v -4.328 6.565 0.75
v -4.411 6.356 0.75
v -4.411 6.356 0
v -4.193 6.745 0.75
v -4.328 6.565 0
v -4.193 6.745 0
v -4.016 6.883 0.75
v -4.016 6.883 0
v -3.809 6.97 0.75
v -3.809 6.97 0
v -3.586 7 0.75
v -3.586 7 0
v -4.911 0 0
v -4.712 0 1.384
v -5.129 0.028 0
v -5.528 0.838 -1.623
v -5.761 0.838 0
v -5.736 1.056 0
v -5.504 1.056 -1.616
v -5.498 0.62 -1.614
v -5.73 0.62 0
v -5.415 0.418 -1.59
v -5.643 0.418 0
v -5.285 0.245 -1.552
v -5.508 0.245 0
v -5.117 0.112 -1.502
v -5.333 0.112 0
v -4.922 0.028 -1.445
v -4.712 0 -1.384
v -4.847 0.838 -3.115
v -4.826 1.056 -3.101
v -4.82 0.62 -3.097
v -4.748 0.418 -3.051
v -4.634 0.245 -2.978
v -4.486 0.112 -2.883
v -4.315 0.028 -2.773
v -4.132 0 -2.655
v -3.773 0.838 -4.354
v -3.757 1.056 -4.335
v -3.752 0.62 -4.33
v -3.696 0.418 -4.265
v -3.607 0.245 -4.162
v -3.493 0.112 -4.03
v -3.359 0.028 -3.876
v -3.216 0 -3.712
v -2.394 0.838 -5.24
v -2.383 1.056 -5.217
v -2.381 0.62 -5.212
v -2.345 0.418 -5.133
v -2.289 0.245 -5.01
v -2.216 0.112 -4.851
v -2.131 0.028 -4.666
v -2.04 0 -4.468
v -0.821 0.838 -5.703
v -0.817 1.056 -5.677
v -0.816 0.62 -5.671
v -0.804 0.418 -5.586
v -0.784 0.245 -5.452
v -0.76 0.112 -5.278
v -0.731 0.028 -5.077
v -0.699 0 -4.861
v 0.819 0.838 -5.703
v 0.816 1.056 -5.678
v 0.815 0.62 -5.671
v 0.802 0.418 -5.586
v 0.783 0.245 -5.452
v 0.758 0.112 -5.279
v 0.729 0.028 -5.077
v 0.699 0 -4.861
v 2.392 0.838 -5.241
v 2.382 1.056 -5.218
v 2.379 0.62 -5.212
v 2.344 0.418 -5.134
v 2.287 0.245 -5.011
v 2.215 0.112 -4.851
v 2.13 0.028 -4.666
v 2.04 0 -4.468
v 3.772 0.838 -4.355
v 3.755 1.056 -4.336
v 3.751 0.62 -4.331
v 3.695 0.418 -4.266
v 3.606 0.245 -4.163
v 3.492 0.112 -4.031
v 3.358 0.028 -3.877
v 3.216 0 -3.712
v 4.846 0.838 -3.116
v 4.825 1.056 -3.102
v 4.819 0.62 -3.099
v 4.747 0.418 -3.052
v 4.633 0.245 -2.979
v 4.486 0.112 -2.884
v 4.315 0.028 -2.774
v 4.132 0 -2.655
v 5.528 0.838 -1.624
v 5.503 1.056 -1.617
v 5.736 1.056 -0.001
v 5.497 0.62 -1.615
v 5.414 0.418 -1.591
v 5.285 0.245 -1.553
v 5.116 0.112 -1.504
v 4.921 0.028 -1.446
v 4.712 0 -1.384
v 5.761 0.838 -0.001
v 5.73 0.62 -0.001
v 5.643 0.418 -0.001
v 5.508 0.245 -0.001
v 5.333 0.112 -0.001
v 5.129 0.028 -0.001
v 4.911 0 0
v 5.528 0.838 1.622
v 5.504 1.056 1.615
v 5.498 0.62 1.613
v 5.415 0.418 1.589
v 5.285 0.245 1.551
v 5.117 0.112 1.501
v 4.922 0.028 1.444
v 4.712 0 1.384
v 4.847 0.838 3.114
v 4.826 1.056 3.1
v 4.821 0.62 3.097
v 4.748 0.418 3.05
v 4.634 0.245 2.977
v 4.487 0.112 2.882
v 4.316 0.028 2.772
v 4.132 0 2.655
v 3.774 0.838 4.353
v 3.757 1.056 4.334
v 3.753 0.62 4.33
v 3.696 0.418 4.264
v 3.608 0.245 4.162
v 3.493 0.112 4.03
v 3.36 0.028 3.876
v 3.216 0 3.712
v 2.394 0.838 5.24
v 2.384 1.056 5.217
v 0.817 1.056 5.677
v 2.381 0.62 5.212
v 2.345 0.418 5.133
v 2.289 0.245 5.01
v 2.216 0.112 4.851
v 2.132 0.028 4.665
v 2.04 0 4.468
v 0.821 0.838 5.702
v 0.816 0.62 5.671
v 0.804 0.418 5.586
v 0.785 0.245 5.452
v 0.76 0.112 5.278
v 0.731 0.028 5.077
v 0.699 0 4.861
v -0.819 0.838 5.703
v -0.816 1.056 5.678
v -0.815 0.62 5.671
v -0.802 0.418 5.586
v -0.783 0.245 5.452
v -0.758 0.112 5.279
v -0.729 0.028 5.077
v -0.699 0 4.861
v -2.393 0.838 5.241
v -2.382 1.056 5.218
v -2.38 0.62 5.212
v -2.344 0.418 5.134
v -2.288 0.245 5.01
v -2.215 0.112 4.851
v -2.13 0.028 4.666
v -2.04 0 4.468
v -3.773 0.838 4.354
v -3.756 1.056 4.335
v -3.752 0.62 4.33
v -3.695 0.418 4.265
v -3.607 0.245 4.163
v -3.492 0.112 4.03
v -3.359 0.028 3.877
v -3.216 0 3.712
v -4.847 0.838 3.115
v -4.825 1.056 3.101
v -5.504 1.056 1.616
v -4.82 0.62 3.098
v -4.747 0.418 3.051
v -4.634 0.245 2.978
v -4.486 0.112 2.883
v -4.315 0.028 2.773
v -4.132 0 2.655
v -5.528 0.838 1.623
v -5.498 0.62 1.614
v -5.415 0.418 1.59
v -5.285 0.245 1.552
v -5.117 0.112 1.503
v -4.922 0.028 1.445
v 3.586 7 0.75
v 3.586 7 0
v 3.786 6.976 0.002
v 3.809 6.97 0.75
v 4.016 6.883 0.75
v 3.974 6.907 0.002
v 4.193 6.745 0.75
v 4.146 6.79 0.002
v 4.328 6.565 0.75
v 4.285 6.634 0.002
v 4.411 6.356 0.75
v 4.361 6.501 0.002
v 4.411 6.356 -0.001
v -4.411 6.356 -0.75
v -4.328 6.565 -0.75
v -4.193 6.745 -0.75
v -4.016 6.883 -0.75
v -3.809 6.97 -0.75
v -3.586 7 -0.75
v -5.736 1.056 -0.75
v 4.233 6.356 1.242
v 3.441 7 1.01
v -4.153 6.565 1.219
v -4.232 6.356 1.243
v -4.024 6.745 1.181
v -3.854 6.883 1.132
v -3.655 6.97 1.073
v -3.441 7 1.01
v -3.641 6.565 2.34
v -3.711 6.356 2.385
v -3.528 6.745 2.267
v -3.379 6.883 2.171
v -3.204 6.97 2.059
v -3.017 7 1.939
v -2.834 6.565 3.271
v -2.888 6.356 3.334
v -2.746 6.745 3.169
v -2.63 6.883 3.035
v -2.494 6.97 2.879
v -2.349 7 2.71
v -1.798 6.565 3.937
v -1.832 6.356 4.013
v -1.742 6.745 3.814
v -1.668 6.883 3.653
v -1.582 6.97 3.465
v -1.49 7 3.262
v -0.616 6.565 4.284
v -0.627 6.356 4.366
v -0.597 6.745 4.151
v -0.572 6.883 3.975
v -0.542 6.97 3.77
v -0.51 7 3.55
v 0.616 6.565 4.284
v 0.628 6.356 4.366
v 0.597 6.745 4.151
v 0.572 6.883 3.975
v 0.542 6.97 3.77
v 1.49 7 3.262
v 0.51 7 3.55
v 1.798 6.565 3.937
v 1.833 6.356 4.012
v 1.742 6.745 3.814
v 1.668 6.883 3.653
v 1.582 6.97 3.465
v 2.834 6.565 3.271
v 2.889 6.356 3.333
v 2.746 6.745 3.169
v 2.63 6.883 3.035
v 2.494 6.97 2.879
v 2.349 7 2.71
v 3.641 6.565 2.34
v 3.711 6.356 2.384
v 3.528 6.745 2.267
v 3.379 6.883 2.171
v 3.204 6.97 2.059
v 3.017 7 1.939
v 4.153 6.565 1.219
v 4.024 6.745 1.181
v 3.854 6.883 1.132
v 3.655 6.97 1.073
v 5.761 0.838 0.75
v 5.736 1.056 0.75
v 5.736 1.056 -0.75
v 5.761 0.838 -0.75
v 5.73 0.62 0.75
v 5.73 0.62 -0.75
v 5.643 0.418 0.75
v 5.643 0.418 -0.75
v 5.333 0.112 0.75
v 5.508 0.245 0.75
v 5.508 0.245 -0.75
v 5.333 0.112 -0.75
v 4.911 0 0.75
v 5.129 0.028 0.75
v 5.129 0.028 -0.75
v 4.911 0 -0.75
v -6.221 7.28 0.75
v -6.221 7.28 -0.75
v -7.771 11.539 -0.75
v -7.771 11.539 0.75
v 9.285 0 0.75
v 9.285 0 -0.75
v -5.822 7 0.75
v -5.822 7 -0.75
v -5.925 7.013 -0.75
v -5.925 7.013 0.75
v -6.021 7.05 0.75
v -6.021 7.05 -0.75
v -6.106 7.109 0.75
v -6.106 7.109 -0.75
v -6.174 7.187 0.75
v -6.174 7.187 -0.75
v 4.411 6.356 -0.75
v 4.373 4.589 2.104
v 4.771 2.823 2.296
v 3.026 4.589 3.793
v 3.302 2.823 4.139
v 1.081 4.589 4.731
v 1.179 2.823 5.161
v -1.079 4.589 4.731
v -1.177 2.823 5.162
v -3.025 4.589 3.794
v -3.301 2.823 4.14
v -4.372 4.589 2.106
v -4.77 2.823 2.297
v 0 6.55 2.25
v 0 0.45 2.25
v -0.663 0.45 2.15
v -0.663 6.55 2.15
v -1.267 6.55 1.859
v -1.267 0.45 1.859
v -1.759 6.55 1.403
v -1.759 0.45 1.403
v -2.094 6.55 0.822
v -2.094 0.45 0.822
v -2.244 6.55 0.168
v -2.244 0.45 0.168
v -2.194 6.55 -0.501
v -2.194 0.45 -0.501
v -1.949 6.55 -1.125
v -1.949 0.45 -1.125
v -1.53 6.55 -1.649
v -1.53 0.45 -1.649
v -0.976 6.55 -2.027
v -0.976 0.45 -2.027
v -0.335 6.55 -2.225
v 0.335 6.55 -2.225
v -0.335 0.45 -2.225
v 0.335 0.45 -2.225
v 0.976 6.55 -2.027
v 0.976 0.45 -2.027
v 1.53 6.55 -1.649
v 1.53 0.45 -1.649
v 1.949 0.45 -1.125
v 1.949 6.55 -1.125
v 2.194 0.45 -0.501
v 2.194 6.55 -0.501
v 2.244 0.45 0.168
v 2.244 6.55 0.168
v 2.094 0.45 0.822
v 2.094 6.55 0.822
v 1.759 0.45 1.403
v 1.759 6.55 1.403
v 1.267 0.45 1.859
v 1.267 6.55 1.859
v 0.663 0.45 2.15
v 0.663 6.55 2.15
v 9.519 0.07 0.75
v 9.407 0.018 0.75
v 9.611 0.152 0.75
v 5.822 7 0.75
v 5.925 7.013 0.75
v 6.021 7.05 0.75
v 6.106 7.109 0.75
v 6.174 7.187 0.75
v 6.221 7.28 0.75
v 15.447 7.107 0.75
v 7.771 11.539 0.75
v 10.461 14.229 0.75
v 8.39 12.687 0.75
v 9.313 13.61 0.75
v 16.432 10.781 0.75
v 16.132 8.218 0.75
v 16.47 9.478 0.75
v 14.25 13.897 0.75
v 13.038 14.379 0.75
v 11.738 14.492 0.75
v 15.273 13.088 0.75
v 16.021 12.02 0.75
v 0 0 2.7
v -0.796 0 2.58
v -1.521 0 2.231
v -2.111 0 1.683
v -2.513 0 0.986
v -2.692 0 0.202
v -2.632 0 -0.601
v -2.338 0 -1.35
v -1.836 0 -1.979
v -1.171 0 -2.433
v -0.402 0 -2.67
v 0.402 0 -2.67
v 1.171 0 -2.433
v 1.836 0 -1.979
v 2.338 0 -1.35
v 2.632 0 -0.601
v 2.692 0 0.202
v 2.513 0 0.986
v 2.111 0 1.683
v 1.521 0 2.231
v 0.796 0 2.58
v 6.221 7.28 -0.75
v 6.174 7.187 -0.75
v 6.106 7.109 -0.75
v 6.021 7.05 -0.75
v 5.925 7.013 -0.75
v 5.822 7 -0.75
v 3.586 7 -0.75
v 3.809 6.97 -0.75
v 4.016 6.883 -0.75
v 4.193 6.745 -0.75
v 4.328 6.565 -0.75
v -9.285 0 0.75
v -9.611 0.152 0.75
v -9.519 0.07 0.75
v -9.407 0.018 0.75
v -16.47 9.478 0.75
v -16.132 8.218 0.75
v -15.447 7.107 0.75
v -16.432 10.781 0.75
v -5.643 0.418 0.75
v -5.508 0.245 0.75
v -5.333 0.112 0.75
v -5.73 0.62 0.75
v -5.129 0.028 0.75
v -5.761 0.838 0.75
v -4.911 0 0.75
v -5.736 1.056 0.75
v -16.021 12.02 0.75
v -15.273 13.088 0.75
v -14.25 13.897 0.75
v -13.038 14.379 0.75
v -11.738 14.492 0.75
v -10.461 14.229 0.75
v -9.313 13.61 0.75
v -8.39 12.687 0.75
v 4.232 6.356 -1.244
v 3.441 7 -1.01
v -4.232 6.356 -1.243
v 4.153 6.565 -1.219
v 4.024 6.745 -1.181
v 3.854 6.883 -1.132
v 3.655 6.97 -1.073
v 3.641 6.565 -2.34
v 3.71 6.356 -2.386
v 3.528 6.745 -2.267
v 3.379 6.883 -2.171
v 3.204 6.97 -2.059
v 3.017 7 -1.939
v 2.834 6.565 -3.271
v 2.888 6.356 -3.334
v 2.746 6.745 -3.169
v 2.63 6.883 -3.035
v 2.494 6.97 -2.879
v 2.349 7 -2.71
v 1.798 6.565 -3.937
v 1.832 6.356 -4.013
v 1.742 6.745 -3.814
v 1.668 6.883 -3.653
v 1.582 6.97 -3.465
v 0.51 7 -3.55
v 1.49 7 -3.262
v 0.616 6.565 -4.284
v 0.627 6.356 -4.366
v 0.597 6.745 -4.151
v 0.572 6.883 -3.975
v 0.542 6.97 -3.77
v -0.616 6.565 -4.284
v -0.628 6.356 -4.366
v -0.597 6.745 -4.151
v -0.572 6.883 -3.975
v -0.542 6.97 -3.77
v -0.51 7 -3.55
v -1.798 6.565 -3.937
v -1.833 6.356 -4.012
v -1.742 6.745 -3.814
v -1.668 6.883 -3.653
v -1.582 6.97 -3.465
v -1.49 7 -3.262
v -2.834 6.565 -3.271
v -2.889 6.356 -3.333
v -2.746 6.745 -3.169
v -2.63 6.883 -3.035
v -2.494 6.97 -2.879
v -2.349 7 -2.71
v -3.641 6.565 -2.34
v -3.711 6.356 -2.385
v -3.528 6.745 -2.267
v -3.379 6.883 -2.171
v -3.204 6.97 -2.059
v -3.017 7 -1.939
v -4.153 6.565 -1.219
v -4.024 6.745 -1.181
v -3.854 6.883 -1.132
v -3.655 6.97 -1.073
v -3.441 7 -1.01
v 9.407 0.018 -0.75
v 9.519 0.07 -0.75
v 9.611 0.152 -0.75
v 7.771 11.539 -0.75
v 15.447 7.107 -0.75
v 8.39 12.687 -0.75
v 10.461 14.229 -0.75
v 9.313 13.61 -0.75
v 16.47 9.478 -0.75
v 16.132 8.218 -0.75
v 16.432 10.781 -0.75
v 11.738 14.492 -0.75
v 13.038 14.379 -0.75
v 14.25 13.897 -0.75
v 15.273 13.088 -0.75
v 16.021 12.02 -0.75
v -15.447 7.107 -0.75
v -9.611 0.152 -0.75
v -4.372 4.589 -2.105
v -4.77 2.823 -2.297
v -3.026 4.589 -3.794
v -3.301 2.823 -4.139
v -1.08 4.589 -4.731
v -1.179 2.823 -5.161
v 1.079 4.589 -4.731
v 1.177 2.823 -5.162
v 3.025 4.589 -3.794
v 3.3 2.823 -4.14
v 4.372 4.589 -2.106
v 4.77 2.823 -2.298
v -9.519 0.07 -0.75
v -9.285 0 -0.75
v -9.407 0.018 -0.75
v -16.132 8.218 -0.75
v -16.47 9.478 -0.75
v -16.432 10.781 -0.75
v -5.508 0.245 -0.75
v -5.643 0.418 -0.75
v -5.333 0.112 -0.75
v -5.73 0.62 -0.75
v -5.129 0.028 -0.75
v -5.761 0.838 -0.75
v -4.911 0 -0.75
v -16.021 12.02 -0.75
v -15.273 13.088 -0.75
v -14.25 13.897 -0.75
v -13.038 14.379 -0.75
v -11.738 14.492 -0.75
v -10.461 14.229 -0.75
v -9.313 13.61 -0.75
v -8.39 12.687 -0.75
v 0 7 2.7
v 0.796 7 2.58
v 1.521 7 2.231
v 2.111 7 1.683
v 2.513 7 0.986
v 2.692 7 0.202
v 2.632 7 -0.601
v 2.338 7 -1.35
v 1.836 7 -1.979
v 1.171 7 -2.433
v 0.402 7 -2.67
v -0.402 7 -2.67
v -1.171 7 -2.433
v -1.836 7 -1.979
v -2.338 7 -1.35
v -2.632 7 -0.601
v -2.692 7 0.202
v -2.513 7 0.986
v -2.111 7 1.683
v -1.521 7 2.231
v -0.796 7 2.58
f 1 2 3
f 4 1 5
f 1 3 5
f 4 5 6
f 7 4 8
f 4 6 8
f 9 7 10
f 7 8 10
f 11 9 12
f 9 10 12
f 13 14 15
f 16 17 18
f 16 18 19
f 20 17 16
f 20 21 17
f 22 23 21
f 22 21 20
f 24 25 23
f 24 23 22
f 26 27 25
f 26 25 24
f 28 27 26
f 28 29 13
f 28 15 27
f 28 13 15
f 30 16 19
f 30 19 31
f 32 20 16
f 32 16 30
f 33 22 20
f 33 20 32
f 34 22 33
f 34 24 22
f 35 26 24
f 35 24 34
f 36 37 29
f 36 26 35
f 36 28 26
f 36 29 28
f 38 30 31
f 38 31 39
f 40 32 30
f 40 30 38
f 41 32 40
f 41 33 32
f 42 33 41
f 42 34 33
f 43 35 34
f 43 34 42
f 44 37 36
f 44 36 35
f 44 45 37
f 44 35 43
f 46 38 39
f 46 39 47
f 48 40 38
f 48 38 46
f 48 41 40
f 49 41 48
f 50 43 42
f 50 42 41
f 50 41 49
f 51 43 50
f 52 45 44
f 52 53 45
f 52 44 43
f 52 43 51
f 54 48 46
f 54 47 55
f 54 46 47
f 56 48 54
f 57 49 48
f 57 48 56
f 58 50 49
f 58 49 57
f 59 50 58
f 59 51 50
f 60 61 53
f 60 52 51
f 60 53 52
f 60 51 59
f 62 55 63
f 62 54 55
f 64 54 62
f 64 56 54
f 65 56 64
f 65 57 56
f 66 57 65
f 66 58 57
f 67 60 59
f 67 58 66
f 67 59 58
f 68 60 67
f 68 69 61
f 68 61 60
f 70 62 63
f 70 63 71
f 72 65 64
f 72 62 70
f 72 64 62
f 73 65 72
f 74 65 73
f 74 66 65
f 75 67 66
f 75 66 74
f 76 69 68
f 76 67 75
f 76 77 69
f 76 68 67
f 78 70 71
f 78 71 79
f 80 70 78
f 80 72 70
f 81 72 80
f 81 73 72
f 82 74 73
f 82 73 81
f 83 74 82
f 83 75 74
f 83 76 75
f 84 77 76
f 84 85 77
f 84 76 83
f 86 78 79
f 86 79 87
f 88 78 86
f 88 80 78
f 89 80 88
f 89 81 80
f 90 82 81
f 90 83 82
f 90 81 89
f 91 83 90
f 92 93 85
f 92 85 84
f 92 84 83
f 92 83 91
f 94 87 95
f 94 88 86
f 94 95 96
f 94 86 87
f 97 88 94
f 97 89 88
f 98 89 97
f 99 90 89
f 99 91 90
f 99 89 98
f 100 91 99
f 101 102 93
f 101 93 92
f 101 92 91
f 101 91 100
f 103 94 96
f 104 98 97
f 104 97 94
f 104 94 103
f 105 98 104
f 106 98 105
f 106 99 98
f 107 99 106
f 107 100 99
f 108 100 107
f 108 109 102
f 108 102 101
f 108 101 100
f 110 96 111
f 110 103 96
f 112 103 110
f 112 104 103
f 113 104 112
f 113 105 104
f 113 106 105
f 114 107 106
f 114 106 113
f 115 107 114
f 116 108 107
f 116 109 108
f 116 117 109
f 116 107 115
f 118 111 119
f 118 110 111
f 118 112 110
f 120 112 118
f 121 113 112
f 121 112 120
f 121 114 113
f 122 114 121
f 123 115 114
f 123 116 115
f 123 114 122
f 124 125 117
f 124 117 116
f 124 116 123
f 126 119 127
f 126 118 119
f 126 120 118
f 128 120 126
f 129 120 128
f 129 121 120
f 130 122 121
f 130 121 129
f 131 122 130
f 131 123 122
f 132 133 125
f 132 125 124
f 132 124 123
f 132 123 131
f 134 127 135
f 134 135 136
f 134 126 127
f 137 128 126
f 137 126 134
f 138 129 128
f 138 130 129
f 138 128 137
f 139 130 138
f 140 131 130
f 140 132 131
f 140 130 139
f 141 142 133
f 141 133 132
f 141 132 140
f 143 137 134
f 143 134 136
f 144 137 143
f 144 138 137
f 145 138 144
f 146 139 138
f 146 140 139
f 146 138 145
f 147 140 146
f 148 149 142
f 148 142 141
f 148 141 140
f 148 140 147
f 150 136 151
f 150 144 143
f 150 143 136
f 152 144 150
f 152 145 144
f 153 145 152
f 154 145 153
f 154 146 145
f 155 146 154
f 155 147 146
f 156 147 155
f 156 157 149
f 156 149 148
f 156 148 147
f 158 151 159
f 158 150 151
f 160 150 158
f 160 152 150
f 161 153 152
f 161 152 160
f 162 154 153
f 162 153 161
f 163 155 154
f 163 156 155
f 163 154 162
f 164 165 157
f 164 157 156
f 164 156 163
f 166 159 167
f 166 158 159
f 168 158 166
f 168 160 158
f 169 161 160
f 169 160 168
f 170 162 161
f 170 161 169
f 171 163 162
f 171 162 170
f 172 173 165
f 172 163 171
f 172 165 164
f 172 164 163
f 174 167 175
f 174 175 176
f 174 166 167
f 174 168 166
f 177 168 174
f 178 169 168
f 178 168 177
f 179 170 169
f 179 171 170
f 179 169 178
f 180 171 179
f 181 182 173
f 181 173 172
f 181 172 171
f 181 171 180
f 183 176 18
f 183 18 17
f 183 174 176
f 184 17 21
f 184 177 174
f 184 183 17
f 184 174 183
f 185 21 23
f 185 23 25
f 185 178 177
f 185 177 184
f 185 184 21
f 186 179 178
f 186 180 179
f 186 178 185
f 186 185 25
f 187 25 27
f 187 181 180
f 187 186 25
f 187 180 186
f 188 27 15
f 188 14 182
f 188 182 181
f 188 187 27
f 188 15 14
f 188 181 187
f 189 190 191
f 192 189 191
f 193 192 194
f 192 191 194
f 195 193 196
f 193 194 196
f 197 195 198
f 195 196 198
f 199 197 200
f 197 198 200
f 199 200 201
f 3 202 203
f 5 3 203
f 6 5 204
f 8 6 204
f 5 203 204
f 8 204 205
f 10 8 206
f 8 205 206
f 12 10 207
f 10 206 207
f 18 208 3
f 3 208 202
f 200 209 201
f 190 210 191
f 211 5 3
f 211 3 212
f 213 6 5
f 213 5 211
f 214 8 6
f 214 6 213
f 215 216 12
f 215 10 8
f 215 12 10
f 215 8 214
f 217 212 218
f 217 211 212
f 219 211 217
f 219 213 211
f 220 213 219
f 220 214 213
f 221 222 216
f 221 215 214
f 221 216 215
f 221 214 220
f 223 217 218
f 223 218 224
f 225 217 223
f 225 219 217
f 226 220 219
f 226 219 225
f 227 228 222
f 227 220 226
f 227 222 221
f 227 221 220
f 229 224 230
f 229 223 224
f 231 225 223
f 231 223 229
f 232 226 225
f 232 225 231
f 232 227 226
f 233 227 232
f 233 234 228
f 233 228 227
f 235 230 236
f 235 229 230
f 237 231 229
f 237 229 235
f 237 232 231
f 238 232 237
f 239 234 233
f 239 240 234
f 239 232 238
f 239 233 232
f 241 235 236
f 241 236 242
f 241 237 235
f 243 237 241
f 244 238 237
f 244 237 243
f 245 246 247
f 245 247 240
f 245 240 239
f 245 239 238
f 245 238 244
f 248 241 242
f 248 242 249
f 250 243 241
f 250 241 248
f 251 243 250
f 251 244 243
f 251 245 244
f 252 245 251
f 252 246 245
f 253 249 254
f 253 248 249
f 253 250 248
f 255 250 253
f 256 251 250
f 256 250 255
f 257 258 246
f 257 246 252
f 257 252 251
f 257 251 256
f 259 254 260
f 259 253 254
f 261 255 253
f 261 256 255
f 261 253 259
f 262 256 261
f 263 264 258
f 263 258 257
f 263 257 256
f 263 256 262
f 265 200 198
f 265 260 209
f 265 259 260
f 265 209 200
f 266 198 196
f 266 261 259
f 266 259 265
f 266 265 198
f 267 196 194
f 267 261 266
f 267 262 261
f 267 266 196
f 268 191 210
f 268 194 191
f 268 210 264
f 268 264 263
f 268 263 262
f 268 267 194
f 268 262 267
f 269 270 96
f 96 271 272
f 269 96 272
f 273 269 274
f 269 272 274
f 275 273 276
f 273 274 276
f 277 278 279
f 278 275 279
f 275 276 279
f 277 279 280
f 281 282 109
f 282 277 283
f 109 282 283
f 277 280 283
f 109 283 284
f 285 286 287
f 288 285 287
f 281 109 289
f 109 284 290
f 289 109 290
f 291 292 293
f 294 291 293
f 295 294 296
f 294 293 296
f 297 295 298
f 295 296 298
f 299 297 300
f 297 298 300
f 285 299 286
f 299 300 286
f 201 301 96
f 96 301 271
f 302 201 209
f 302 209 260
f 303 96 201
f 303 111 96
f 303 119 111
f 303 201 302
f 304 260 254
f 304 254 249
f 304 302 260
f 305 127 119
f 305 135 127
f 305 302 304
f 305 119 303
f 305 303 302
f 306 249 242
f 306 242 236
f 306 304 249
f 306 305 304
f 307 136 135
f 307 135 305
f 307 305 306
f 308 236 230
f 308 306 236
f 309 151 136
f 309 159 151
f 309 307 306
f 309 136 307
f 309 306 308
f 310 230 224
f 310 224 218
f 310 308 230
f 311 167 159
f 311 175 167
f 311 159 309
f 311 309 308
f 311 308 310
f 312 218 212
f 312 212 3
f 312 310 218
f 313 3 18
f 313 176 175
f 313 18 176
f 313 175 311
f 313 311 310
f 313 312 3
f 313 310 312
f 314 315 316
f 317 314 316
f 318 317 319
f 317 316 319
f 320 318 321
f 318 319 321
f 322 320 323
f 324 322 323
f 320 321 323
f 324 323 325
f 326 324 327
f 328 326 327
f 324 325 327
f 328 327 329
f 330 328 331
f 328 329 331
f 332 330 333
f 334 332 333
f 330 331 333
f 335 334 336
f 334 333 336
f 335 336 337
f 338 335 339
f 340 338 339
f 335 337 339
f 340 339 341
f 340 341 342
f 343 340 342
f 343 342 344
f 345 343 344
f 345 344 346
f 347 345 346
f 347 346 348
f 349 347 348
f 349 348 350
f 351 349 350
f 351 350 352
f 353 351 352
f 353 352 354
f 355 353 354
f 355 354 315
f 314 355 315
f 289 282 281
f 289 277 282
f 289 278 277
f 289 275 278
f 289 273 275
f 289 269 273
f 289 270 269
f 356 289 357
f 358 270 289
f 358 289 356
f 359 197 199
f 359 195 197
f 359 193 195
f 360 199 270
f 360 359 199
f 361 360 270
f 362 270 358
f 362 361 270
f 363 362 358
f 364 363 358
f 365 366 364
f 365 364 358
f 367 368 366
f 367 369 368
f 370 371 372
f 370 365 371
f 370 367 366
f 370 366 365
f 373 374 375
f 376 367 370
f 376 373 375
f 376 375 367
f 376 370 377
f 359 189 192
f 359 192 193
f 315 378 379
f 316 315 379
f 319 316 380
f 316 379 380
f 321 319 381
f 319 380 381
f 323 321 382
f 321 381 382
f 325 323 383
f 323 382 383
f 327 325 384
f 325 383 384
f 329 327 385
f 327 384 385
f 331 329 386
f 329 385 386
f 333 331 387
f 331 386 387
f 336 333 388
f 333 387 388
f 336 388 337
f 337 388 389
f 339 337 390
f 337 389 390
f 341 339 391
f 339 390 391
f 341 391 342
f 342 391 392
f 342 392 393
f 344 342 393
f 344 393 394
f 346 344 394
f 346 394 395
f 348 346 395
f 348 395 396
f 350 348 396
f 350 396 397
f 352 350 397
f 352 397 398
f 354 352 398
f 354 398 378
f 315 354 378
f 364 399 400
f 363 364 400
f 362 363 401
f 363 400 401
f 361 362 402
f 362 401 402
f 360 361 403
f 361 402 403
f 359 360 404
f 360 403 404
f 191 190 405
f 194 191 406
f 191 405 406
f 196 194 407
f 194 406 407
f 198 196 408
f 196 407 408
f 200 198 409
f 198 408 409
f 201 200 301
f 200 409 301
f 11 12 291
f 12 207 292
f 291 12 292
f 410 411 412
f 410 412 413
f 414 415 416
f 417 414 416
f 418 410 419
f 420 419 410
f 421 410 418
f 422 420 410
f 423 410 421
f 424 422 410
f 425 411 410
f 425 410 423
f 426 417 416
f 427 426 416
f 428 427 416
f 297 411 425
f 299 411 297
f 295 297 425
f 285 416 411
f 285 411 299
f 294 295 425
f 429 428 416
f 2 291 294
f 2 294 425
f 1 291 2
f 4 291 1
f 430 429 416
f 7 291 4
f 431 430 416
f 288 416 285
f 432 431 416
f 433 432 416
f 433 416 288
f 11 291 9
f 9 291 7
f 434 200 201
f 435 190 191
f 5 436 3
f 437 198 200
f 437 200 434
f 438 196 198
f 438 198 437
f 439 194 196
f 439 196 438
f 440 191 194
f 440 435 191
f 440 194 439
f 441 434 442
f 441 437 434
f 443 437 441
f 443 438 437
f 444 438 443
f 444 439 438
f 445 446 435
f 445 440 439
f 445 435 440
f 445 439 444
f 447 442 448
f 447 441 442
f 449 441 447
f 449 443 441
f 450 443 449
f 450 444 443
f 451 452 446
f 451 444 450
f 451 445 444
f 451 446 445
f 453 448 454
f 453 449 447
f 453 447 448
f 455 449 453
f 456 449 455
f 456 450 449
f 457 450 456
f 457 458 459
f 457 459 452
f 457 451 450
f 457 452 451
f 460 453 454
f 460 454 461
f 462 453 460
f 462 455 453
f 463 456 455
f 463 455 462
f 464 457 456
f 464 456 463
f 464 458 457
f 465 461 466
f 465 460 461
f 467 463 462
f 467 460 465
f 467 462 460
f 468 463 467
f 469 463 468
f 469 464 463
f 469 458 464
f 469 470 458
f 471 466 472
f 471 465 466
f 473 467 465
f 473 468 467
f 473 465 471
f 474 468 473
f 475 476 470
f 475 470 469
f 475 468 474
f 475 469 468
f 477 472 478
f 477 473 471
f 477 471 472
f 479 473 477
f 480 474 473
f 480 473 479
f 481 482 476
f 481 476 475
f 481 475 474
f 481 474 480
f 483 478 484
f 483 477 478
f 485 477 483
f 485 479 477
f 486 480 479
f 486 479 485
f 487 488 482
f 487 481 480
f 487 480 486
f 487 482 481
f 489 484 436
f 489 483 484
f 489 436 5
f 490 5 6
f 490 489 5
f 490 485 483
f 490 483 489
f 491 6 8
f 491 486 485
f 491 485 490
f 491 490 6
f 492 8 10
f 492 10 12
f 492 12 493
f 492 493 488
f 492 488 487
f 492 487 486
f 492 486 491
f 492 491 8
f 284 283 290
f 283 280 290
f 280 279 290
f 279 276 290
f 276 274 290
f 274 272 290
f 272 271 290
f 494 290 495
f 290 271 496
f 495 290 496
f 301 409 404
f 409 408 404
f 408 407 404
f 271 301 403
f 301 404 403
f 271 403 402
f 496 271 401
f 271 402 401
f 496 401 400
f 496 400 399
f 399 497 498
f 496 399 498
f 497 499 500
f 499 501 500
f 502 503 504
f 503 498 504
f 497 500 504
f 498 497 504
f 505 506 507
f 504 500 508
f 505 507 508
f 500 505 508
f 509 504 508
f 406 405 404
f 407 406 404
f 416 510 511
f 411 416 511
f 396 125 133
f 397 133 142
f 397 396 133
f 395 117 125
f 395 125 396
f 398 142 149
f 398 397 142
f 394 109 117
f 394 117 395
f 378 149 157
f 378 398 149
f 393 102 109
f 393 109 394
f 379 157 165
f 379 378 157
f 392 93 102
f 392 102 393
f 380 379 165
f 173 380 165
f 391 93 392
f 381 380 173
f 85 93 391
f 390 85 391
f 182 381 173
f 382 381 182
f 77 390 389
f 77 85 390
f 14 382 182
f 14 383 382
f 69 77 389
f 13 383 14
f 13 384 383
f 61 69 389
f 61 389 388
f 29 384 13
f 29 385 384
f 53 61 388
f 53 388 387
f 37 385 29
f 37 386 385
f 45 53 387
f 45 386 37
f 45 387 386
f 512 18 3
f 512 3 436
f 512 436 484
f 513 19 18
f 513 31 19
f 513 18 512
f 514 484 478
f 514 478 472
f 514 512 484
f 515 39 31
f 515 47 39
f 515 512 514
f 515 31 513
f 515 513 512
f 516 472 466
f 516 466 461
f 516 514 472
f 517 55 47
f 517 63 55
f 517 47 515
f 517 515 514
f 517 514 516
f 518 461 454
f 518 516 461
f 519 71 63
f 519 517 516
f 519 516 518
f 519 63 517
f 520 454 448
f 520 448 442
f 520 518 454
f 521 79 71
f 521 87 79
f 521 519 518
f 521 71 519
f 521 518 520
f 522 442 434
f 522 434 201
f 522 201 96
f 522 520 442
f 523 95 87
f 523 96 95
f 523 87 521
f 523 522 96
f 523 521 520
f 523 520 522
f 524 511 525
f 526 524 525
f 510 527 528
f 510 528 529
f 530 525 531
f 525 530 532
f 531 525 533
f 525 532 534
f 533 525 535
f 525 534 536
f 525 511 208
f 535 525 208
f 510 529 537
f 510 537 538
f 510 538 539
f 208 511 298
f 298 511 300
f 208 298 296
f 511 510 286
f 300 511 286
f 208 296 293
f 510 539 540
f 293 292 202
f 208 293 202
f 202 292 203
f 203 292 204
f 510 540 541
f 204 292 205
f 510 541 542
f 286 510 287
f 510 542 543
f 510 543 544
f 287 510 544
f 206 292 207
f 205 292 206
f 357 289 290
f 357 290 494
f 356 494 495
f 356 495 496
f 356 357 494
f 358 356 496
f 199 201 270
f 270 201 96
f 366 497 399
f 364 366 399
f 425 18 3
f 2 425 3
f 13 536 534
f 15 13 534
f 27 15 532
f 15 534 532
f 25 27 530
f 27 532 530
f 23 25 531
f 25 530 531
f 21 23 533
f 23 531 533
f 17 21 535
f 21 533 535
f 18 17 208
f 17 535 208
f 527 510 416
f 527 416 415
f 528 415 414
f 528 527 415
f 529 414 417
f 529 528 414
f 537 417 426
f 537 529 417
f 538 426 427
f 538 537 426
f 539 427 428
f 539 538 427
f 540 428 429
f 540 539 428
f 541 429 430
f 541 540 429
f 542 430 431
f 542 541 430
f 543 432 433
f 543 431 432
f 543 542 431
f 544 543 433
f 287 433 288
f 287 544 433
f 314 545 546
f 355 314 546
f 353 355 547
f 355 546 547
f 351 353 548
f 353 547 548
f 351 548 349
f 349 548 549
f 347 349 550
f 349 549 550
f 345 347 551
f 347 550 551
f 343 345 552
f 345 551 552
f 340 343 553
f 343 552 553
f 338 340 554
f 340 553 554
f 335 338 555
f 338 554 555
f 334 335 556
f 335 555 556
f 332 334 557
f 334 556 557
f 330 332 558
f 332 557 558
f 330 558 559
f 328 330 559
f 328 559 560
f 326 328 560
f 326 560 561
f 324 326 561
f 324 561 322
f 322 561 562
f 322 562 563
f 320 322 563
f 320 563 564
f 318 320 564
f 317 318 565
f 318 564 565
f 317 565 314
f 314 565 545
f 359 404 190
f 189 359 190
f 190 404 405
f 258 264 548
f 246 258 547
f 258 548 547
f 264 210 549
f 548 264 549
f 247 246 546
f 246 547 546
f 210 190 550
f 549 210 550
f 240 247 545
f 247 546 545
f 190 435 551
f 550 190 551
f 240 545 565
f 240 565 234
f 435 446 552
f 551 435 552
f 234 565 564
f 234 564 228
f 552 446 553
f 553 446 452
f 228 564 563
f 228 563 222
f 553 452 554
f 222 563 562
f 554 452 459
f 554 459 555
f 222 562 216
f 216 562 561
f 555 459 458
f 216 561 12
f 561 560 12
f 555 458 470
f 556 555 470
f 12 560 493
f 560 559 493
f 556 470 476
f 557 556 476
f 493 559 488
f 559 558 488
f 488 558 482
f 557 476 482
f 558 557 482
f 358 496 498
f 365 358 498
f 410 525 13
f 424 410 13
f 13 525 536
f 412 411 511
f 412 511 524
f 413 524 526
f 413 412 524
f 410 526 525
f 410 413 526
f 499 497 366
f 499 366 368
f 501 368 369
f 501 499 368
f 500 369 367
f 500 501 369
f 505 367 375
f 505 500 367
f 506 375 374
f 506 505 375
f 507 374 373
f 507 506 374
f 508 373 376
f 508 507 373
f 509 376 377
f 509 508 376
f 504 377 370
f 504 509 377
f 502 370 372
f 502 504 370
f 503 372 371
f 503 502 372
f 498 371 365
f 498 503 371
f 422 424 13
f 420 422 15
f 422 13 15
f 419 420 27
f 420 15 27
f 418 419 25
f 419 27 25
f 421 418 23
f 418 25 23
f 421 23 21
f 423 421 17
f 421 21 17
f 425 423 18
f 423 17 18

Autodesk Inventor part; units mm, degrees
ref_plane "YZ Plane" through (0, 0, 0) normal (1, 0, 0) x (0, 1, 0)
ref_plane "XZ Plane" through (0, 0, 0) normal (0, 1, 0) x (-1, 0, 0)
ref_plane "XY Plane" through (0, 0, 0) normal (0, 0, 1) x (1, 0, 0)
sketch "Sketch1" plane through (0, 0, 0) normal (0, 0, 1) x (1, 0, 0)
  line L0 (0, 0) -> (0, 7)
  line L1 (0, 7) -> (-4.25, 7)
  line L2 (-4.25, 7) -> (-6, 0)
  line L3 (-6, 0) -> (0, 0)
  line L4 (0, 0) -> (0, -3.908269)
  dimension "BaseHt" = 7
  dimension "BaseTopDia" = 8.5
  dimension "BaseDia" = 12
sketch "Sketch1 outline for Revolution1" plane through (0, 0, 0) normal (0, 0, 1) x (1, 0, 0)
  line L0 (-6, 0) -> (0, 0)
  line L1 (-4.25, 7) -> (-6, 0)
  line L2 (0, 7) -> (-4.25, 7)
  line L3 (0, 0) -> (0, 7)
revolve "Revolution1" add sketch "Sketch1 outline for Revolution1" angle 360 about axis through (0, 0, 0) along (0, -1, 0)
fillet "Fillet1" radius 0.85 2 edges at (4.25, 7, 0) (6, 0, 0)
sketch "Sketch2" plane through (0, 0, 0) normal (0, 0, 1) x (1, 0, 0)
  arc A0 (-5.735961, 1.056155) -> (-4.91134, 0) centre (-4.91134, 0.85) ccw
  line L0 (-5.735961, 1.056155) -> (-4.410961, 6.356155)
  arc A1 (-3.58634, 7) -> (-4.410961, 6.356155) centre (-3.58634, 6.15) ccw
  line L1 (-3.58634, 7) -> (3.58634, 7)
  arc A2 (4.410961, 6.356155) -> (3.58634, 7) centre (3.58634, 6.15) ccw
  line L2 (4.410961, 6.356155) -> (5.735961, 1.056155)
  arc A3 (4.91134, 0) -> (5.735961, 1.056155) centre (4.91134, 0.85) ccw
  line L3 (4.91134, 0) -> (-4.91134, 0)
  line L4 (-4.91134, 0) -> (-9.483336, 0)
  line L5 (-9.483336, 0) -> (-15.4472, 7.107456)
  arc A4 (-7.771383, 11.539091) -> (-15.4472, 7.107456) centre (-12, 10) ccw
  line L6 (-7.771383, 11.539091) -> (-6.119289, 7)
  line L7 (-6.119289, 7) -> (-3.58634, 7)
  line L8 (0, 0) -> (0, 7)
  dimension "d5" = 50
  dimension "d6" = 20
  dimension "WingNutRad" = 4.5
  dimension "WingNutHt" = 10
  dimension "WingNutCen" = 24
sketch "Sketch2 outline for Extrusion1" plane through (0, 0, 0) normal (0, 0, 1) x (1, 0, 0)
  line L0 (-9.483336, 0) -> (-4.91134, 0)
  line L1 (-15.4472, 7.107456) -> (-9.483336, 0)
  arc A0 (-7.771383, 11.539091) -> (-15.4472, 7.107456) centre (-12, 10) ccw
  line L2 (-6.119289, 7) -> (-7.771383, 11.539091)
  line L3 (-3.58634, 7) -> (-6.119289, 7)
  arc A1 (-4.410961, 6.356155) -> (-3.58634, 7) centre (-3.58634, 6.15) cw
  line L4 (-5.735961, 1.056155) -> (-4.410961, 6.356155)
  arc A2 (-4.91134, 0) -> (-5.735961, 1.056155) centre (-4.91134, 0.85) cw
extrude "Extrusion1" add sketch "Sketch2 outline for Extrusion1" along normal mid plane 1.5
fillet "Fillet2" radius 0.425 2 edges at (-6.1193, 7, 0) (-9.4833, 0, 0)
mirror "Mirror1" about plane through (0, 0, 0) normal (1, 0, 0) of "Extrusion1", "Fillet2"
hole "Hole1" at (0, 7, 0) direction (0, -1, 0) diameter 4.5 end through all clearance for "Hex Head Cap Screw DIN EN 24017" size "M4" standard "DIN"
chamfer "Chamfer1" distance 0.45 angle 45 2 edges at (0, 7, -2.25) (0, 0, -2.25)
equation "\"d4\" = 0.1 * BaseTopDia"
equation "\"d12\" = 0.05 * BaseTopDia"
equation "\"d22\" = 0.1 * d15"
equation "\"d15\" = 4.5"
properties part number "IntroToiLogic01_2015" material "Steel"
